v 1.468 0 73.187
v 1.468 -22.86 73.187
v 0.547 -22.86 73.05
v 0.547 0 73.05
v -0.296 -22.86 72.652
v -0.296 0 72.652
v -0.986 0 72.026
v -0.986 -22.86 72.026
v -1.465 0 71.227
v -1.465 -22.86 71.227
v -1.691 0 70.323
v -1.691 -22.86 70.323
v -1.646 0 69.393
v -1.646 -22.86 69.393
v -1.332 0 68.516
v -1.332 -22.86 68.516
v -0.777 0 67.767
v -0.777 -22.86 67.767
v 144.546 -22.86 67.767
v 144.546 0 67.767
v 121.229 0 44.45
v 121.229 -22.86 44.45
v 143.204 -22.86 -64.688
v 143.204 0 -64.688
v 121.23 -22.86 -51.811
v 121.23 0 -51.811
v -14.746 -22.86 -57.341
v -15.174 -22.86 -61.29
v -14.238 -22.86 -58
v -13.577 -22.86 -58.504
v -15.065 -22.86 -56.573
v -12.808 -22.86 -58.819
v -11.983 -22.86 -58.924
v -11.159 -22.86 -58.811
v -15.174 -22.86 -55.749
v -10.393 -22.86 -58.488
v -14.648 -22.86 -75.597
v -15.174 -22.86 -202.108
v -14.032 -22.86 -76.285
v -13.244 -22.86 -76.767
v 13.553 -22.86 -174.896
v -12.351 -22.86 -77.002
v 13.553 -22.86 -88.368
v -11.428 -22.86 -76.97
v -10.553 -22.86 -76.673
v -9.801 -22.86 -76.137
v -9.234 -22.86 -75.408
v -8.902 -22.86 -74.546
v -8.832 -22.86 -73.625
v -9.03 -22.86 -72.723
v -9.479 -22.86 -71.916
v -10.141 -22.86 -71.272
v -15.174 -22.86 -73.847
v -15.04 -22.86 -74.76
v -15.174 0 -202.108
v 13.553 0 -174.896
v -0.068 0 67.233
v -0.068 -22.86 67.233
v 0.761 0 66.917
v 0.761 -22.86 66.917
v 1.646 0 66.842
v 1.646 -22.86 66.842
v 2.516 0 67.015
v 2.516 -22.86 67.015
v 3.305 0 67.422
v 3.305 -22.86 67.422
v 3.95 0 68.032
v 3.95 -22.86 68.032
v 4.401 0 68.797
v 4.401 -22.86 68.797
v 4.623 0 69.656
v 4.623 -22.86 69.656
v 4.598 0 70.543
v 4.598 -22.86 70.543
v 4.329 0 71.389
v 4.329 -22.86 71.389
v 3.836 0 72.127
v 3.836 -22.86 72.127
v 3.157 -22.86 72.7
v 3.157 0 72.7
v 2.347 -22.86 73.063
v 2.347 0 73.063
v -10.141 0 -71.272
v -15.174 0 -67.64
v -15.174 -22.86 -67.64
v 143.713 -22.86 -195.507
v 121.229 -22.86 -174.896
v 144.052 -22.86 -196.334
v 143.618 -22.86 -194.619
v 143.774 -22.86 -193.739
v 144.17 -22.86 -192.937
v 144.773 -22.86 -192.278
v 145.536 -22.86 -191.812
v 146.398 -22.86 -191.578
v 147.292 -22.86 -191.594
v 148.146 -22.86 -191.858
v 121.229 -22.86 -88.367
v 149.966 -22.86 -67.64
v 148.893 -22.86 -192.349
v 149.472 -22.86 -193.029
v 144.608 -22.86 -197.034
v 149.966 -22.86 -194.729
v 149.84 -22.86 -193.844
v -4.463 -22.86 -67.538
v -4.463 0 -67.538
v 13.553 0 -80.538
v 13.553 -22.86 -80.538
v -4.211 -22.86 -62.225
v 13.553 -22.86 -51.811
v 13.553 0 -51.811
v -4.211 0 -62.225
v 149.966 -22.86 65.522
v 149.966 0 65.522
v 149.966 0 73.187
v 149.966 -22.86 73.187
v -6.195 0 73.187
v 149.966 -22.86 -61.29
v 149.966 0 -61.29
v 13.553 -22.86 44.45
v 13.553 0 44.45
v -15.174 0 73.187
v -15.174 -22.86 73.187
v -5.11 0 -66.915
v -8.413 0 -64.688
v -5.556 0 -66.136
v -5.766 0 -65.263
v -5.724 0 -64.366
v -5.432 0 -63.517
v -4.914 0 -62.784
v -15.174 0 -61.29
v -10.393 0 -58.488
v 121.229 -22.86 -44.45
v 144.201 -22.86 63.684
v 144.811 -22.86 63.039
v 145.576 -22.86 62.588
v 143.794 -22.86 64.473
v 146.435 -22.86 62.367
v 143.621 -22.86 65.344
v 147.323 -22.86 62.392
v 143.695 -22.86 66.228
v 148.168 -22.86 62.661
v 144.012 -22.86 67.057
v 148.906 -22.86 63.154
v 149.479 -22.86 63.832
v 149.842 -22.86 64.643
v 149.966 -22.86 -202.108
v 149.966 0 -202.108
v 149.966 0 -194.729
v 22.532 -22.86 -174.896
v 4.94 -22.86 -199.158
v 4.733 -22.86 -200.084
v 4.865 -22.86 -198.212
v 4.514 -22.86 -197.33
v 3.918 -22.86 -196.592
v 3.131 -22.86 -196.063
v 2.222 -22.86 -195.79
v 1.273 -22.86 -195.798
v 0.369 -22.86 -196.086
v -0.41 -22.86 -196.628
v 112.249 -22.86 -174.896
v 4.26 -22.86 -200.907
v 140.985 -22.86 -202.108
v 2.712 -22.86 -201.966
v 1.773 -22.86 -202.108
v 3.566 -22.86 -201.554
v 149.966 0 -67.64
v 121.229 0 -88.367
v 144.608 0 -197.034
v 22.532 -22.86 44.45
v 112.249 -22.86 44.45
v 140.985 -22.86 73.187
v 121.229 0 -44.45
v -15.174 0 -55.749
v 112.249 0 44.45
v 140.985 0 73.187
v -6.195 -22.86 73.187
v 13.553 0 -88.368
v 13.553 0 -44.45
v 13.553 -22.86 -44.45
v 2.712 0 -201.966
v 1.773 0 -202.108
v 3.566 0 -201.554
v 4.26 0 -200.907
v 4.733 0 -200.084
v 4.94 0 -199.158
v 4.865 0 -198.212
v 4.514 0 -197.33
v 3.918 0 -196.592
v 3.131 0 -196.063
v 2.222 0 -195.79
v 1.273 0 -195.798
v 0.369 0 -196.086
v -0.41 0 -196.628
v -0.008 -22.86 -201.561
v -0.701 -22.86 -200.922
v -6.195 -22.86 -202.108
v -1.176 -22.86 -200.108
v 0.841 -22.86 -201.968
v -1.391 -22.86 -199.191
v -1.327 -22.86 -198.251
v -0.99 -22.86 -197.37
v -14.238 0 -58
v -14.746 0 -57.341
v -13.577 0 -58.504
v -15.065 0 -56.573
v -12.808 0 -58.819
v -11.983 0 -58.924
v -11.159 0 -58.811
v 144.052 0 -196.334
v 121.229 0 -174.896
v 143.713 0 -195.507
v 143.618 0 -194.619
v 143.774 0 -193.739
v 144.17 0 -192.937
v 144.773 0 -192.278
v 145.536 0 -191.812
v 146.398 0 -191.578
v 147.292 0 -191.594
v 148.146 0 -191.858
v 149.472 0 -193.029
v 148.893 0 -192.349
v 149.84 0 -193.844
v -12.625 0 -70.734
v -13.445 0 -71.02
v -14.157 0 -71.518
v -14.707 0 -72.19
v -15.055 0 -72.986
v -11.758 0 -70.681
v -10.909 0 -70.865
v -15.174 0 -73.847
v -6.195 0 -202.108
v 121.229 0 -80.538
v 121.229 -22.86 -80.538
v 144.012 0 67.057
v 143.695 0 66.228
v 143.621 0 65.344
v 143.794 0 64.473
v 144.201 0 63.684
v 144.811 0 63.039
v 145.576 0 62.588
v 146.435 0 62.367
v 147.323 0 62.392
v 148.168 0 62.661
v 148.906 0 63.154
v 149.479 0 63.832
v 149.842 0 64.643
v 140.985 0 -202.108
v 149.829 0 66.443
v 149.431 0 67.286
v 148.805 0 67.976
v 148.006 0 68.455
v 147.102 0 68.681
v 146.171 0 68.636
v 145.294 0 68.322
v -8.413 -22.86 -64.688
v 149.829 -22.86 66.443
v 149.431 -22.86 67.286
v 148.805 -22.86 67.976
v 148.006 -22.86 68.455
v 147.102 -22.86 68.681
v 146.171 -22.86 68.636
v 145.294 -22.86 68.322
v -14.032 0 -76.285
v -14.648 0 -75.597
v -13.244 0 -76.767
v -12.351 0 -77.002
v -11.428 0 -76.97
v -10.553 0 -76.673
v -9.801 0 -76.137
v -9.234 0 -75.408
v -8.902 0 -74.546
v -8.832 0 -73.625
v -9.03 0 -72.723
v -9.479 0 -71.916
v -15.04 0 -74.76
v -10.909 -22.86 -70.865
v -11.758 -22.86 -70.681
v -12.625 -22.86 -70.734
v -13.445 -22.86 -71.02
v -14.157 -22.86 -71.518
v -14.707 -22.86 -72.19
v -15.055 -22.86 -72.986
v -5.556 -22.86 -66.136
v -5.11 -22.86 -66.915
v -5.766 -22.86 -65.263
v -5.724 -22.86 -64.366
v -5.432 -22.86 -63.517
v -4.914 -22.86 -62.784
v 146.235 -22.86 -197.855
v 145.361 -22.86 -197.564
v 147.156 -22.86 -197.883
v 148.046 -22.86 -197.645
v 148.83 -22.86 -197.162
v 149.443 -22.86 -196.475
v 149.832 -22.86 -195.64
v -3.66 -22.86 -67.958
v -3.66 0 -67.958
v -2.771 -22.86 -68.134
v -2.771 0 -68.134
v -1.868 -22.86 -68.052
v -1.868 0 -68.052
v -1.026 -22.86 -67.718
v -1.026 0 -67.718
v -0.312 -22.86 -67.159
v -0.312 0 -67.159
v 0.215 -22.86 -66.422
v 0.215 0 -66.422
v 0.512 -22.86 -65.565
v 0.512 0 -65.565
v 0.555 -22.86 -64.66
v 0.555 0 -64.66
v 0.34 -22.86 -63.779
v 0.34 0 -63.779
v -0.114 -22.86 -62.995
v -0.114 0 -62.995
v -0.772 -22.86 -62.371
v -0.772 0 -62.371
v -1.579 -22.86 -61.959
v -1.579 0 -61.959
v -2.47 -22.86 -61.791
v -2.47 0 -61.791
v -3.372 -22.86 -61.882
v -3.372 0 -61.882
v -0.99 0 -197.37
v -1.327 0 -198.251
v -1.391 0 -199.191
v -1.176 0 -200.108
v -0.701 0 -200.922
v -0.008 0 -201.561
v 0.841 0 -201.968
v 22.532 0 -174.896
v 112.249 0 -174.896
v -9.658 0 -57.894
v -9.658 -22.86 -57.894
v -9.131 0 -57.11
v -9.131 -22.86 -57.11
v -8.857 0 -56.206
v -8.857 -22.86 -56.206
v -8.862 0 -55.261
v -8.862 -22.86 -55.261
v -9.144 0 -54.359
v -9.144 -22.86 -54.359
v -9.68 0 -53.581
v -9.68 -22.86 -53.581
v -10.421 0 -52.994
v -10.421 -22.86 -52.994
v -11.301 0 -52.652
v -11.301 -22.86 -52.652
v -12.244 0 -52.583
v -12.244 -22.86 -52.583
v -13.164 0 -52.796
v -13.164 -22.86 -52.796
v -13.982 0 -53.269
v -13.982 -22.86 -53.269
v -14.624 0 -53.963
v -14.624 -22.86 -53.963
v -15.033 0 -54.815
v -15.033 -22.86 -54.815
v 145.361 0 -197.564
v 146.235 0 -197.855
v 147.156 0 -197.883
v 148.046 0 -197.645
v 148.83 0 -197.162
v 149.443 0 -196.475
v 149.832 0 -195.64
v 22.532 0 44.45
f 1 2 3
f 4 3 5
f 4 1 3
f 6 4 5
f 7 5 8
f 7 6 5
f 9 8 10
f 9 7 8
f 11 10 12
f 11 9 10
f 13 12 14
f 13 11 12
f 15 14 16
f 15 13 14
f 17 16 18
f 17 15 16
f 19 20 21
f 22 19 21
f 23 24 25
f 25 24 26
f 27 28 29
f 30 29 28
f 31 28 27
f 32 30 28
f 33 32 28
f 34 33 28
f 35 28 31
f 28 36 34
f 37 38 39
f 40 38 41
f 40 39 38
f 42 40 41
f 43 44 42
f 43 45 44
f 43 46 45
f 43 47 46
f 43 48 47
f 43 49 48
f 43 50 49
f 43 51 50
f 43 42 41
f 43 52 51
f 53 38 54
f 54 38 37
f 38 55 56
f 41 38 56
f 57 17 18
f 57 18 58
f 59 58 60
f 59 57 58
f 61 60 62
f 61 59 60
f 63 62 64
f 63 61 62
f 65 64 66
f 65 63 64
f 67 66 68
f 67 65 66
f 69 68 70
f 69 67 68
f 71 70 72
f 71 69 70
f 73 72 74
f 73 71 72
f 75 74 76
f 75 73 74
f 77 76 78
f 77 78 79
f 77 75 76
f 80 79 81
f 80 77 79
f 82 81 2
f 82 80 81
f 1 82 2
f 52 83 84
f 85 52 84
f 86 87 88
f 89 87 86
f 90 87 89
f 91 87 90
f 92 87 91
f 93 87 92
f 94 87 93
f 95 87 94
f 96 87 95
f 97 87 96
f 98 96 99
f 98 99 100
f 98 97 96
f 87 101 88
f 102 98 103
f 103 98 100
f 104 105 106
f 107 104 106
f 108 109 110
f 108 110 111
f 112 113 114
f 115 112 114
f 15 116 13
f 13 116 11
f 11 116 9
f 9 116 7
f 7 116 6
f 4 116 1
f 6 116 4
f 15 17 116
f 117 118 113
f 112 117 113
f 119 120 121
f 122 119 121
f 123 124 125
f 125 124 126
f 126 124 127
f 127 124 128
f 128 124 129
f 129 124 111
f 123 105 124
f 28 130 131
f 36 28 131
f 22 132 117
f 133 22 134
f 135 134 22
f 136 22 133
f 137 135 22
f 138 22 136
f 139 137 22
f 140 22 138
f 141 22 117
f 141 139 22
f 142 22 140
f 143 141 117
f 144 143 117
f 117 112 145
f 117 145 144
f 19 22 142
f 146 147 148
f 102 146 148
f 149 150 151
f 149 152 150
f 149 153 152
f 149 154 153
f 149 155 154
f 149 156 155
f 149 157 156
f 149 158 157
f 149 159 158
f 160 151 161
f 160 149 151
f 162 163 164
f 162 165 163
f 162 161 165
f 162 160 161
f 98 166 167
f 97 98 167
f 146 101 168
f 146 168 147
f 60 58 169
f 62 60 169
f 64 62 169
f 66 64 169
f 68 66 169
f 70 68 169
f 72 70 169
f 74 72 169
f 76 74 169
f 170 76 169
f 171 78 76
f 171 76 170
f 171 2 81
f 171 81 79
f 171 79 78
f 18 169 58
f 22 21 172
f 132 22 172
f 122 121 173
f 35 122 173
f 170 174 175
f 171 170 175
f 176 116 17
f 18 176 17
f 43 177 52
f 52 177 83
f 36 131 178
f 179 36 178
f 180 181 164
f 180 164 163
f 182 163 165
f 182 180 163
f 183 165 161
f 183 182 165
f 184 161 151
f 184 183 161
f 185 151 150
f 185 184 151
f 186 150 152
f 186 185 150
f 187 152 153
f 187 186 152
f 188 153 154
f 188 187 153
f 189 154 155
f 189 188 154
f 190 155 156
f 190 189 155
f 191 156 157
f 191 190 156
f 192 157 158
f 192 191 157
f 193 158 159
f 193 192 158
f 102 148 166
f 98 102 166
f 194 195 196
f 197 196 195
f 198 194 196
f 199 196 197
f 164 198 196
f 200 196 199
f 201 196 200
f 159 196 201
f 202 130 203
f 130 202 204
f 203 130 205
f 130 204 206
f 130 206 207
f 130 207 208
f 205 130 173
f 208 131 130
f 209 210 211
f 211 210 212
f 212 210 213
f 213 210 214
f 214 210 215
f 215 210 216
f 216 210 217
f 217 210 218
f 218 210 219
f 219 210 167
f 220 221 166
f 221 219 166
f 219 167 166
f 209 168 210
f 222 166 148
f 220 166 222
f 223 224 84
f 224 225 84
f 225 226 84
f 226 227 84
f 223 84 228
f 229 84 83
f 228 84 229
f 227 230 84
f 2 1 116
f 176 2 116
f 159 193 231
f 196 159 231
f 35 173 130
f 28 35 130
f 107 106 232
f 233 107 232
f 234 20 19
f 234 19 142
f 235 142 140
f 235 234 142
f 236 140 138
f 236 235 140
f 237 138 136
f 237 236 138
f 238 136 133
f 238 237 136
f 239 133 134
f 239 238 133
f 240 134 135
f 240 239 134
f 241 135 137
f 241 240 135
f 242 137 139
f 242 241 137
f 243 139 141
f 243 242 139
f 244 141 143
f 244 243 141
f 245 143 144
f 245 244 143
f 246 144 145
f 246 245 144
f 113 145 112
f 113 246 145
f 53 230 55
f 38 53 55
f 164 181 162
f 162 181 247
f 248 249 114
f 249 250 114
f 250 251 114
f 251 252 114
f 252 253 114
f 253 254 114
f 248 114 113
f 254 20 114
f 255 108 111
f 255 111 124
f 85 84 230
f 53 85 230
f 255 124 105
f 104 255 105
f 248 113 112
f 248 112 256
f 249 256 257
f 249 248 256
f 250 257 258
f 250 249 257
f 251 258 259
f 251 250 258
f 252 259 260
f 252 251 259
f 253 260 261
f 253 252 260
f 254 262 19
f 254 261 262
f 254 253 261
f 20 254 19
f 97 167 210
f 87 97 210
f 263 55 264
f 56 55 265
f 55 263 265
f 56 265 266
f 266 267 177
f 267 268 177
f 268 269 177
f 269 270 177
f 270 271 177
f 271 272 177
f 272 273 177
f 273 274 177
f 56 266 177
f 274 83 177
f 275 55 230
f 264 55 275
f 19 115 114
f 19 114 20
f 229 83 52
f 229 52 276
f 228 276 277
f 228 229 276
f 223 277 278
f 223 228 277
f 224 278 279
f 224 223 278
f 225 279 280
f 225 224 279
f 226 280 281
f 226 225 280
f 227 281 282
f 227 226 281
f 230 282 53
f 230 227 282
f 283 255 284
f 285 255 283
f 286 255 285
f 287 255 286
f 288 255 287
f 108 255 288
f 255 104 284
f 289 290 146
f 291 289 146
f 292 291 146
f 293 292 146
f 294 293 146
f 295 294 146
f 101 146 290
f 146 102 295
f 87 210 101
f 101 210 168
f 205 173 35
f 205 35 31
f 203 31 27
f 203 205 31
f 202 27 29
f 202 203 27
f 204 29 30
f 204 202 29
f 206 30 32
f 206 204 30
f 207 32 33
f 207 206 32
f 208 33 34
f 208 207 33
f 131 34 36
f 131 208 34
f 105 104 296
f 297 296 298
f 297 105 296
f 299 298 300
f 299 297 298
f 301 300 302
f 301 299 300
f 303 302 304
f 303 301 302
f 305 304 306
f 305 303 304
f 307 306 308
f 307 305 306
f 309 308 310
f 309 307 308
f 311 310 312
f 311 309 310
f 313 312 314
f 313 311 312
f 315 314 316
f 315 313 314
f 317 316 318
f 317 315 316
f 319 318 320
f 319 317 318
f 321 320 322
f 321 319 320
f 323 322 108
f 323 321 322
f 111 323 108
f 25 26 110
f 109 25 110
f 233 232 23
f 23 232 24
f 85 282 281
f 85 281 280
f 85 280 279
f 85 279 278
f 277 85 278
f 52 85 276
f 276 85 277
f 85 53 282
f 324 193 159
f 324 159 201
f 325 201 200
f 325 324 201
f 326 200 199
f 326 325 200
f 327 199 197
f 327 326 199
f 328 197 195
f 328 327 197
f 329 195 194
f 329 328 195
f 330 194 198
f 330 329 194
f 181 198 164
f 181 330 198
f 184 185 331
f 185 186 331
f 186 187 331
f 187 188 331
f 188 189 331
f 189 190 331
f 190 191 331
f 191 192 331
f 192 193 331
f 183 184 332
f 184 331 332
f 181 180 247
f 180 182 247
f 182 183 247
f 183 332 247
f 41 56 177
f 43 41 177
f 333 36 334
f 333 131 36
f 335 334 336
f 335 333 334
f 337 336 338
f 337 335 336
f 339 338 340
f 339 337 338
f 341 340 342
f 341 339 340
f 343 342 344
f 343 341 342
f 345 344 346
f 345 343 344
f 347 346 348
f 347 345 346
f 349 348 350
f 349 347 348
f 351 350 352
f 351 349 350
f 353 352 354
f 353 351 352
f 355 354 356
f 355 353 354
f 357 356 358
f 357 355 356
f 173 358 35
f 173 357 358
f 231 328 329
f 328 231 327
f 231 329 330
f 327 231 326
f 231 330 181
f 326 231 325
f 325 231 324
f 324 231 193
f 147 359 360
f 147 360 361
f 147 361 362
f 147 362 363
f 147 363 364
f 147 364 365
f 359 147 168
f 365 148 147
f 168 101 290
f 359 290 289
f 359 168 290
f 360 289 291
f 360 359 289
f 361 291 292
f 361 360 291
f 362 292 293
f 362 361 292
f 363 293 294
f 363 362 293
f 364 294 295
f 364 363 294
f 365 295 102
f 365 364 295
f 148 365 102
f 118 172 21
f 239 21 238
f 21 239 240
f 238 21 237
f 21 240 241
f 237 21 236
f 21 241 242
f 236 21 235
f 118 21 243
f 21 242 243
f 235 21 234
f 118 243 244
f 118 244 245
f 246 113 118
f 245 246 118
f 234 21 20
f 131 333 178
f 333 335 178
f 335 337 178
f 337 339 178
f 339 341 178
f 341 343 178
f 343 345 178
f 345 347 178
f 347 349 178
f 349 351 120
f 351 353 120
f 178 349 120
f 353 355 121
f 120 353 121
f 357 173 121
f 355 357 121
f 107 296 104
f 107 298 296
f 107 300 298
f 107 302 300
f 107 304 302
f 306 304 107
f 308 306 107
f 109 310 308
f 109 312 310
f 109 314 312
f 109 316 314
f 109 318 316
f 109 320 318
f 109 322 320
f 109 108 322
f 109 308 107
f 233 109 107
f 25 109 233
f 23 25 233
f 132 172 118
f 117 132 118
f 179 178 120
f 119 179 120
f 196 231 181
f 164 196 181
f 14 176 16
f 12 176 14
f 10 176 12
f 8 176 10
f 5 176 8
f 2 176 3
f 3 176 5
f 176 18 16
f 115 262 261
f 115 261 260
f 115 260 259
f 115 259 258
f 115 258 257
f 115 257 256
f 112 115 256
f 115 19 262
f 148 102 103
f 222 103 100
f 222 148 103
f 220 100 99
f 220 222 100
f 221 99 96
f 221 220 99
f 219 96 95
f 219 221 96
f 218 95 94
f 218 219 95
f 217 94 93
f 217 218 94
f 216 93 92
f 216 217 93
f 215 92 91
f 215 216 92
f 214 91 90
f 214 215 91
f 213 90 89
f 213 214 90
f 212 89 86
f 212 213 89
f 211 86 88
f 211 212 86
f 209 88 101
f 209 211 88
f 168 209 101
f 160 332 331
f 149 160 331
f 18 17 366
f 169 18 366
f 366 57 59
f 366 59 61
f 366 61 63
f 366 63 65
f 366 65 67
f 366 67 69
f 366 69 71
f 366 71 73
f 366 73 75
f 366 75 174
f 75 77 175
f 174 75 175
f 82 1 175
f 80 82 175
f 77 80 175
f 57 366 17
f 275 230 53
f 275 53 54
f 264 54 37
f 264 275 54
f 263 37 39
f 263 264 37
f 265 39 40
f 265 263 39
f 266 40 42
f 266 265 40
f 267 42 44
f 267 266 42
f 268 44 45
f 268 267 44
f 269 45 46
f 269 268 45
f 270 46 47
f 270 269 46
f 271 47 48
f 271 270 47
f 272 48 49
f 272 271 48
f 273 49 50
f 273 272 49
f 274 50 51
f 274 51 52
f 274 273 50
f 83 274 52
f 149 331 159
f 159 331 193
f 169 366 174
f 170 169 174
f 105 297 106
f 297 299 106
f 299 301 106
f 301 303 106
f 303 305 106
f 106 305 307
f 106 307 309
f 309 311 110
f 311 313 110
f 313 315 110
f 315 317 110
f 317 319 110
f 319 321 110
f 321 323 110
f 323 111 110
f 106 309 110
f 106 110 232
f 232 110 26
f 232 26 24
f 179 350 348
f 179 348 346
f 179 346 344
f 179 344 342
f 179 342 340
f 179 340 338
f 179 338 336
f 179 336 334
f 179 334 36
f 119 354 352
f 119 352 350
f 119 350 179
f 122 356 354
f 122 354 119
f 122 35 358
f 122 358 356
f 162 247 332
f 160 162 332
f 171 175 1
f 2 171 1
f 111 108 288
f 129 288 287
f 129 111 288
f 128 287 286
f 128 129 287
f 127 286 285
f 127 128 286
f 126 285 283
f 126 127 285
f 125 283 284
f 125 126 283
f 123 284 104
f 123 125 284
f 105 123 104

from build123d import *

# Parameters (mm, degrees)
F1_DEPTH = 22.86
F2_R     = 3.175
F3_DEPTH = 25.4


with BuildPart() as f1:
    # F0 (on Front) → F1 (new body)
    with BuildSketch(Plane.XZ):
        Polygon((-15.1739238592, -61.2904866815), (13.5534761408, -44.45), (13.5534761408, 44.45), (-15.1739238592, 73.1868195874), align=None)
    extrude(amount=F1_DEPTH)


with BuildPart() as f1b:
    # F0 (on Front) → F1, piece 2 (new body)
    with BuildSketch(Plane.XZ):
        Polygon((140.9854855022, 73.1868195874), (-6.195139428, 73.1868195874), (22.532260572, 44.45), (112.2486659148, 44.45), align=None)
    extrude(amount=F1_DEPTH)


with BuildPart() as f1c:
    # F0 (on Front) → F1, piece 3 (new body)
    with BuildSketch(Plane.XZ):
        Polygon((121.228922036, -174.8955888238), (149.9657416234, -202.1080866815), (149.9657416234, -67.6404866815), (121.228922036, -88.3673402517), align=None)
    extrude(amount=F1_DEPTH)


with BuildPart() as f1d:
    # F0 (on Front) → F1, piece 4 (new body)
    with BuildSketch(Plane.XZ):
        Polygon((13.5534761408, -51.8106613985), (-8.4134451263, -64.6880413574), (13.5534761408, -80.5380613985), (121.2287825639, -80.5380613985), (143.2040990216, -64.6880413574), (121.2299748981, -51.8106613985), align=None)
    extrude(amount=F1_DEPTH)


with BuildPart() as f1e:
    # F0 (on Front) → F1, piece 5 (new body)
    with BuildSketch(Plane.XZ):
        Polygon((13.5534761408, -88.368464908), (-15.1739238592, -67.6404866815), (-15.1739238592, -202.1080866815), (13.5534761408, -174.8955888238), align=None)
    extrude(amount=F1_DEPTH)


with BuildPart() as f1f:
    # F0 (on Front) → F1, piece 6 (new body)
    with BuildSketch(Plane.XZ):
        Polygon((22.532260572, -174.8955888238), (-6.195139428, -202.1080866815), (140.9854855022, -202.1080866815), (112.2486659148, -174.8955888238), align=None)
    extrude(amount=F1_DEPTH)


with BuildPart() as f1g:
    # F0 (on Front) → F1, piece 7 (new body)
    with BuildSketch(Plane.XZ):
        Polygon((149.9657416234, -61.2904866815), (149.9657416233, 73.1868195874), (121.2289220359, 44.45), (121.228922036, -44.45), align=None)
    extrude(amount=F1_DEPTH)


with BuildPart() as f3_tool:
    # F2 (on face) → F3 (new body)
    with BuildSketch(Plane.XZ):
        with Locations((-11.9989238592, -55.7489174012)):
            Circle(F2_R)
        with Locations((-11.9989238592, -73.8465790448)):
            Circle(F2_R)
        with Locations((-2.605385107, -64.9635892569)):
            Circle(F2_R)
        with Locations((1.7734120806, -198.9330866815)):
            Circle(F2_R)
        with Locations((146.7907416234, -194.728839653)):
            Circle(F2_R)
        with Locations((1.4682120604, 70.0118195874)):
            Circle(F2_R)
        with Locations((146.7907416233, 65.5216915269)):
            Circle(F2_R)
    extrude(amount=F3_DEPTH)


with BuildPart() as f1_1:
    add(f1.part)

    # F3: cut by f3_tool
    add(f3_tool.part, mode=Mode.SUBTRACT)


with BuildPart() as f1b_1:
    add(f1b.part)

    # F3: cut by f3_tool
    add(f3_tool.part, mode=Mode.SUBTRACT)


with BuildPart() as f1c_1:
    add(f1c.part)

    # F3: cut by f3_tool
    add(f3_tool.part, mode=Mode.SUBTRACT)


with BuildPart() as f1d_1:
    add(f1d.part)

    # F3: cut by f3_tool
    add(f3_tool.part, mode=Mode.SUBTRACT)


with BuildPart() as f1e_1:
    add(f1e.part)

    # F3: cut by f3_tool
    add(f3_tool.part, mode=Mode.SUBTRACT)


with BuildPart() as f1f_1:
    add(f1f.part)

    # F3: cut by f3_tool
    add(f3_tool.part, mode=Mode.SUBTRACT)


with BuildPart() as f1g_1:
    add(f1g.part)

    # F3: cut by f3_tool
    add(f3_tool.part, mode=Mode.SUBTRACT)


solid = Compound([f1_1.part, f1b_1.part, f1c_1.part, f1d_1.part, f1e_1.part, f1f_1.part, f1g_1.part])
